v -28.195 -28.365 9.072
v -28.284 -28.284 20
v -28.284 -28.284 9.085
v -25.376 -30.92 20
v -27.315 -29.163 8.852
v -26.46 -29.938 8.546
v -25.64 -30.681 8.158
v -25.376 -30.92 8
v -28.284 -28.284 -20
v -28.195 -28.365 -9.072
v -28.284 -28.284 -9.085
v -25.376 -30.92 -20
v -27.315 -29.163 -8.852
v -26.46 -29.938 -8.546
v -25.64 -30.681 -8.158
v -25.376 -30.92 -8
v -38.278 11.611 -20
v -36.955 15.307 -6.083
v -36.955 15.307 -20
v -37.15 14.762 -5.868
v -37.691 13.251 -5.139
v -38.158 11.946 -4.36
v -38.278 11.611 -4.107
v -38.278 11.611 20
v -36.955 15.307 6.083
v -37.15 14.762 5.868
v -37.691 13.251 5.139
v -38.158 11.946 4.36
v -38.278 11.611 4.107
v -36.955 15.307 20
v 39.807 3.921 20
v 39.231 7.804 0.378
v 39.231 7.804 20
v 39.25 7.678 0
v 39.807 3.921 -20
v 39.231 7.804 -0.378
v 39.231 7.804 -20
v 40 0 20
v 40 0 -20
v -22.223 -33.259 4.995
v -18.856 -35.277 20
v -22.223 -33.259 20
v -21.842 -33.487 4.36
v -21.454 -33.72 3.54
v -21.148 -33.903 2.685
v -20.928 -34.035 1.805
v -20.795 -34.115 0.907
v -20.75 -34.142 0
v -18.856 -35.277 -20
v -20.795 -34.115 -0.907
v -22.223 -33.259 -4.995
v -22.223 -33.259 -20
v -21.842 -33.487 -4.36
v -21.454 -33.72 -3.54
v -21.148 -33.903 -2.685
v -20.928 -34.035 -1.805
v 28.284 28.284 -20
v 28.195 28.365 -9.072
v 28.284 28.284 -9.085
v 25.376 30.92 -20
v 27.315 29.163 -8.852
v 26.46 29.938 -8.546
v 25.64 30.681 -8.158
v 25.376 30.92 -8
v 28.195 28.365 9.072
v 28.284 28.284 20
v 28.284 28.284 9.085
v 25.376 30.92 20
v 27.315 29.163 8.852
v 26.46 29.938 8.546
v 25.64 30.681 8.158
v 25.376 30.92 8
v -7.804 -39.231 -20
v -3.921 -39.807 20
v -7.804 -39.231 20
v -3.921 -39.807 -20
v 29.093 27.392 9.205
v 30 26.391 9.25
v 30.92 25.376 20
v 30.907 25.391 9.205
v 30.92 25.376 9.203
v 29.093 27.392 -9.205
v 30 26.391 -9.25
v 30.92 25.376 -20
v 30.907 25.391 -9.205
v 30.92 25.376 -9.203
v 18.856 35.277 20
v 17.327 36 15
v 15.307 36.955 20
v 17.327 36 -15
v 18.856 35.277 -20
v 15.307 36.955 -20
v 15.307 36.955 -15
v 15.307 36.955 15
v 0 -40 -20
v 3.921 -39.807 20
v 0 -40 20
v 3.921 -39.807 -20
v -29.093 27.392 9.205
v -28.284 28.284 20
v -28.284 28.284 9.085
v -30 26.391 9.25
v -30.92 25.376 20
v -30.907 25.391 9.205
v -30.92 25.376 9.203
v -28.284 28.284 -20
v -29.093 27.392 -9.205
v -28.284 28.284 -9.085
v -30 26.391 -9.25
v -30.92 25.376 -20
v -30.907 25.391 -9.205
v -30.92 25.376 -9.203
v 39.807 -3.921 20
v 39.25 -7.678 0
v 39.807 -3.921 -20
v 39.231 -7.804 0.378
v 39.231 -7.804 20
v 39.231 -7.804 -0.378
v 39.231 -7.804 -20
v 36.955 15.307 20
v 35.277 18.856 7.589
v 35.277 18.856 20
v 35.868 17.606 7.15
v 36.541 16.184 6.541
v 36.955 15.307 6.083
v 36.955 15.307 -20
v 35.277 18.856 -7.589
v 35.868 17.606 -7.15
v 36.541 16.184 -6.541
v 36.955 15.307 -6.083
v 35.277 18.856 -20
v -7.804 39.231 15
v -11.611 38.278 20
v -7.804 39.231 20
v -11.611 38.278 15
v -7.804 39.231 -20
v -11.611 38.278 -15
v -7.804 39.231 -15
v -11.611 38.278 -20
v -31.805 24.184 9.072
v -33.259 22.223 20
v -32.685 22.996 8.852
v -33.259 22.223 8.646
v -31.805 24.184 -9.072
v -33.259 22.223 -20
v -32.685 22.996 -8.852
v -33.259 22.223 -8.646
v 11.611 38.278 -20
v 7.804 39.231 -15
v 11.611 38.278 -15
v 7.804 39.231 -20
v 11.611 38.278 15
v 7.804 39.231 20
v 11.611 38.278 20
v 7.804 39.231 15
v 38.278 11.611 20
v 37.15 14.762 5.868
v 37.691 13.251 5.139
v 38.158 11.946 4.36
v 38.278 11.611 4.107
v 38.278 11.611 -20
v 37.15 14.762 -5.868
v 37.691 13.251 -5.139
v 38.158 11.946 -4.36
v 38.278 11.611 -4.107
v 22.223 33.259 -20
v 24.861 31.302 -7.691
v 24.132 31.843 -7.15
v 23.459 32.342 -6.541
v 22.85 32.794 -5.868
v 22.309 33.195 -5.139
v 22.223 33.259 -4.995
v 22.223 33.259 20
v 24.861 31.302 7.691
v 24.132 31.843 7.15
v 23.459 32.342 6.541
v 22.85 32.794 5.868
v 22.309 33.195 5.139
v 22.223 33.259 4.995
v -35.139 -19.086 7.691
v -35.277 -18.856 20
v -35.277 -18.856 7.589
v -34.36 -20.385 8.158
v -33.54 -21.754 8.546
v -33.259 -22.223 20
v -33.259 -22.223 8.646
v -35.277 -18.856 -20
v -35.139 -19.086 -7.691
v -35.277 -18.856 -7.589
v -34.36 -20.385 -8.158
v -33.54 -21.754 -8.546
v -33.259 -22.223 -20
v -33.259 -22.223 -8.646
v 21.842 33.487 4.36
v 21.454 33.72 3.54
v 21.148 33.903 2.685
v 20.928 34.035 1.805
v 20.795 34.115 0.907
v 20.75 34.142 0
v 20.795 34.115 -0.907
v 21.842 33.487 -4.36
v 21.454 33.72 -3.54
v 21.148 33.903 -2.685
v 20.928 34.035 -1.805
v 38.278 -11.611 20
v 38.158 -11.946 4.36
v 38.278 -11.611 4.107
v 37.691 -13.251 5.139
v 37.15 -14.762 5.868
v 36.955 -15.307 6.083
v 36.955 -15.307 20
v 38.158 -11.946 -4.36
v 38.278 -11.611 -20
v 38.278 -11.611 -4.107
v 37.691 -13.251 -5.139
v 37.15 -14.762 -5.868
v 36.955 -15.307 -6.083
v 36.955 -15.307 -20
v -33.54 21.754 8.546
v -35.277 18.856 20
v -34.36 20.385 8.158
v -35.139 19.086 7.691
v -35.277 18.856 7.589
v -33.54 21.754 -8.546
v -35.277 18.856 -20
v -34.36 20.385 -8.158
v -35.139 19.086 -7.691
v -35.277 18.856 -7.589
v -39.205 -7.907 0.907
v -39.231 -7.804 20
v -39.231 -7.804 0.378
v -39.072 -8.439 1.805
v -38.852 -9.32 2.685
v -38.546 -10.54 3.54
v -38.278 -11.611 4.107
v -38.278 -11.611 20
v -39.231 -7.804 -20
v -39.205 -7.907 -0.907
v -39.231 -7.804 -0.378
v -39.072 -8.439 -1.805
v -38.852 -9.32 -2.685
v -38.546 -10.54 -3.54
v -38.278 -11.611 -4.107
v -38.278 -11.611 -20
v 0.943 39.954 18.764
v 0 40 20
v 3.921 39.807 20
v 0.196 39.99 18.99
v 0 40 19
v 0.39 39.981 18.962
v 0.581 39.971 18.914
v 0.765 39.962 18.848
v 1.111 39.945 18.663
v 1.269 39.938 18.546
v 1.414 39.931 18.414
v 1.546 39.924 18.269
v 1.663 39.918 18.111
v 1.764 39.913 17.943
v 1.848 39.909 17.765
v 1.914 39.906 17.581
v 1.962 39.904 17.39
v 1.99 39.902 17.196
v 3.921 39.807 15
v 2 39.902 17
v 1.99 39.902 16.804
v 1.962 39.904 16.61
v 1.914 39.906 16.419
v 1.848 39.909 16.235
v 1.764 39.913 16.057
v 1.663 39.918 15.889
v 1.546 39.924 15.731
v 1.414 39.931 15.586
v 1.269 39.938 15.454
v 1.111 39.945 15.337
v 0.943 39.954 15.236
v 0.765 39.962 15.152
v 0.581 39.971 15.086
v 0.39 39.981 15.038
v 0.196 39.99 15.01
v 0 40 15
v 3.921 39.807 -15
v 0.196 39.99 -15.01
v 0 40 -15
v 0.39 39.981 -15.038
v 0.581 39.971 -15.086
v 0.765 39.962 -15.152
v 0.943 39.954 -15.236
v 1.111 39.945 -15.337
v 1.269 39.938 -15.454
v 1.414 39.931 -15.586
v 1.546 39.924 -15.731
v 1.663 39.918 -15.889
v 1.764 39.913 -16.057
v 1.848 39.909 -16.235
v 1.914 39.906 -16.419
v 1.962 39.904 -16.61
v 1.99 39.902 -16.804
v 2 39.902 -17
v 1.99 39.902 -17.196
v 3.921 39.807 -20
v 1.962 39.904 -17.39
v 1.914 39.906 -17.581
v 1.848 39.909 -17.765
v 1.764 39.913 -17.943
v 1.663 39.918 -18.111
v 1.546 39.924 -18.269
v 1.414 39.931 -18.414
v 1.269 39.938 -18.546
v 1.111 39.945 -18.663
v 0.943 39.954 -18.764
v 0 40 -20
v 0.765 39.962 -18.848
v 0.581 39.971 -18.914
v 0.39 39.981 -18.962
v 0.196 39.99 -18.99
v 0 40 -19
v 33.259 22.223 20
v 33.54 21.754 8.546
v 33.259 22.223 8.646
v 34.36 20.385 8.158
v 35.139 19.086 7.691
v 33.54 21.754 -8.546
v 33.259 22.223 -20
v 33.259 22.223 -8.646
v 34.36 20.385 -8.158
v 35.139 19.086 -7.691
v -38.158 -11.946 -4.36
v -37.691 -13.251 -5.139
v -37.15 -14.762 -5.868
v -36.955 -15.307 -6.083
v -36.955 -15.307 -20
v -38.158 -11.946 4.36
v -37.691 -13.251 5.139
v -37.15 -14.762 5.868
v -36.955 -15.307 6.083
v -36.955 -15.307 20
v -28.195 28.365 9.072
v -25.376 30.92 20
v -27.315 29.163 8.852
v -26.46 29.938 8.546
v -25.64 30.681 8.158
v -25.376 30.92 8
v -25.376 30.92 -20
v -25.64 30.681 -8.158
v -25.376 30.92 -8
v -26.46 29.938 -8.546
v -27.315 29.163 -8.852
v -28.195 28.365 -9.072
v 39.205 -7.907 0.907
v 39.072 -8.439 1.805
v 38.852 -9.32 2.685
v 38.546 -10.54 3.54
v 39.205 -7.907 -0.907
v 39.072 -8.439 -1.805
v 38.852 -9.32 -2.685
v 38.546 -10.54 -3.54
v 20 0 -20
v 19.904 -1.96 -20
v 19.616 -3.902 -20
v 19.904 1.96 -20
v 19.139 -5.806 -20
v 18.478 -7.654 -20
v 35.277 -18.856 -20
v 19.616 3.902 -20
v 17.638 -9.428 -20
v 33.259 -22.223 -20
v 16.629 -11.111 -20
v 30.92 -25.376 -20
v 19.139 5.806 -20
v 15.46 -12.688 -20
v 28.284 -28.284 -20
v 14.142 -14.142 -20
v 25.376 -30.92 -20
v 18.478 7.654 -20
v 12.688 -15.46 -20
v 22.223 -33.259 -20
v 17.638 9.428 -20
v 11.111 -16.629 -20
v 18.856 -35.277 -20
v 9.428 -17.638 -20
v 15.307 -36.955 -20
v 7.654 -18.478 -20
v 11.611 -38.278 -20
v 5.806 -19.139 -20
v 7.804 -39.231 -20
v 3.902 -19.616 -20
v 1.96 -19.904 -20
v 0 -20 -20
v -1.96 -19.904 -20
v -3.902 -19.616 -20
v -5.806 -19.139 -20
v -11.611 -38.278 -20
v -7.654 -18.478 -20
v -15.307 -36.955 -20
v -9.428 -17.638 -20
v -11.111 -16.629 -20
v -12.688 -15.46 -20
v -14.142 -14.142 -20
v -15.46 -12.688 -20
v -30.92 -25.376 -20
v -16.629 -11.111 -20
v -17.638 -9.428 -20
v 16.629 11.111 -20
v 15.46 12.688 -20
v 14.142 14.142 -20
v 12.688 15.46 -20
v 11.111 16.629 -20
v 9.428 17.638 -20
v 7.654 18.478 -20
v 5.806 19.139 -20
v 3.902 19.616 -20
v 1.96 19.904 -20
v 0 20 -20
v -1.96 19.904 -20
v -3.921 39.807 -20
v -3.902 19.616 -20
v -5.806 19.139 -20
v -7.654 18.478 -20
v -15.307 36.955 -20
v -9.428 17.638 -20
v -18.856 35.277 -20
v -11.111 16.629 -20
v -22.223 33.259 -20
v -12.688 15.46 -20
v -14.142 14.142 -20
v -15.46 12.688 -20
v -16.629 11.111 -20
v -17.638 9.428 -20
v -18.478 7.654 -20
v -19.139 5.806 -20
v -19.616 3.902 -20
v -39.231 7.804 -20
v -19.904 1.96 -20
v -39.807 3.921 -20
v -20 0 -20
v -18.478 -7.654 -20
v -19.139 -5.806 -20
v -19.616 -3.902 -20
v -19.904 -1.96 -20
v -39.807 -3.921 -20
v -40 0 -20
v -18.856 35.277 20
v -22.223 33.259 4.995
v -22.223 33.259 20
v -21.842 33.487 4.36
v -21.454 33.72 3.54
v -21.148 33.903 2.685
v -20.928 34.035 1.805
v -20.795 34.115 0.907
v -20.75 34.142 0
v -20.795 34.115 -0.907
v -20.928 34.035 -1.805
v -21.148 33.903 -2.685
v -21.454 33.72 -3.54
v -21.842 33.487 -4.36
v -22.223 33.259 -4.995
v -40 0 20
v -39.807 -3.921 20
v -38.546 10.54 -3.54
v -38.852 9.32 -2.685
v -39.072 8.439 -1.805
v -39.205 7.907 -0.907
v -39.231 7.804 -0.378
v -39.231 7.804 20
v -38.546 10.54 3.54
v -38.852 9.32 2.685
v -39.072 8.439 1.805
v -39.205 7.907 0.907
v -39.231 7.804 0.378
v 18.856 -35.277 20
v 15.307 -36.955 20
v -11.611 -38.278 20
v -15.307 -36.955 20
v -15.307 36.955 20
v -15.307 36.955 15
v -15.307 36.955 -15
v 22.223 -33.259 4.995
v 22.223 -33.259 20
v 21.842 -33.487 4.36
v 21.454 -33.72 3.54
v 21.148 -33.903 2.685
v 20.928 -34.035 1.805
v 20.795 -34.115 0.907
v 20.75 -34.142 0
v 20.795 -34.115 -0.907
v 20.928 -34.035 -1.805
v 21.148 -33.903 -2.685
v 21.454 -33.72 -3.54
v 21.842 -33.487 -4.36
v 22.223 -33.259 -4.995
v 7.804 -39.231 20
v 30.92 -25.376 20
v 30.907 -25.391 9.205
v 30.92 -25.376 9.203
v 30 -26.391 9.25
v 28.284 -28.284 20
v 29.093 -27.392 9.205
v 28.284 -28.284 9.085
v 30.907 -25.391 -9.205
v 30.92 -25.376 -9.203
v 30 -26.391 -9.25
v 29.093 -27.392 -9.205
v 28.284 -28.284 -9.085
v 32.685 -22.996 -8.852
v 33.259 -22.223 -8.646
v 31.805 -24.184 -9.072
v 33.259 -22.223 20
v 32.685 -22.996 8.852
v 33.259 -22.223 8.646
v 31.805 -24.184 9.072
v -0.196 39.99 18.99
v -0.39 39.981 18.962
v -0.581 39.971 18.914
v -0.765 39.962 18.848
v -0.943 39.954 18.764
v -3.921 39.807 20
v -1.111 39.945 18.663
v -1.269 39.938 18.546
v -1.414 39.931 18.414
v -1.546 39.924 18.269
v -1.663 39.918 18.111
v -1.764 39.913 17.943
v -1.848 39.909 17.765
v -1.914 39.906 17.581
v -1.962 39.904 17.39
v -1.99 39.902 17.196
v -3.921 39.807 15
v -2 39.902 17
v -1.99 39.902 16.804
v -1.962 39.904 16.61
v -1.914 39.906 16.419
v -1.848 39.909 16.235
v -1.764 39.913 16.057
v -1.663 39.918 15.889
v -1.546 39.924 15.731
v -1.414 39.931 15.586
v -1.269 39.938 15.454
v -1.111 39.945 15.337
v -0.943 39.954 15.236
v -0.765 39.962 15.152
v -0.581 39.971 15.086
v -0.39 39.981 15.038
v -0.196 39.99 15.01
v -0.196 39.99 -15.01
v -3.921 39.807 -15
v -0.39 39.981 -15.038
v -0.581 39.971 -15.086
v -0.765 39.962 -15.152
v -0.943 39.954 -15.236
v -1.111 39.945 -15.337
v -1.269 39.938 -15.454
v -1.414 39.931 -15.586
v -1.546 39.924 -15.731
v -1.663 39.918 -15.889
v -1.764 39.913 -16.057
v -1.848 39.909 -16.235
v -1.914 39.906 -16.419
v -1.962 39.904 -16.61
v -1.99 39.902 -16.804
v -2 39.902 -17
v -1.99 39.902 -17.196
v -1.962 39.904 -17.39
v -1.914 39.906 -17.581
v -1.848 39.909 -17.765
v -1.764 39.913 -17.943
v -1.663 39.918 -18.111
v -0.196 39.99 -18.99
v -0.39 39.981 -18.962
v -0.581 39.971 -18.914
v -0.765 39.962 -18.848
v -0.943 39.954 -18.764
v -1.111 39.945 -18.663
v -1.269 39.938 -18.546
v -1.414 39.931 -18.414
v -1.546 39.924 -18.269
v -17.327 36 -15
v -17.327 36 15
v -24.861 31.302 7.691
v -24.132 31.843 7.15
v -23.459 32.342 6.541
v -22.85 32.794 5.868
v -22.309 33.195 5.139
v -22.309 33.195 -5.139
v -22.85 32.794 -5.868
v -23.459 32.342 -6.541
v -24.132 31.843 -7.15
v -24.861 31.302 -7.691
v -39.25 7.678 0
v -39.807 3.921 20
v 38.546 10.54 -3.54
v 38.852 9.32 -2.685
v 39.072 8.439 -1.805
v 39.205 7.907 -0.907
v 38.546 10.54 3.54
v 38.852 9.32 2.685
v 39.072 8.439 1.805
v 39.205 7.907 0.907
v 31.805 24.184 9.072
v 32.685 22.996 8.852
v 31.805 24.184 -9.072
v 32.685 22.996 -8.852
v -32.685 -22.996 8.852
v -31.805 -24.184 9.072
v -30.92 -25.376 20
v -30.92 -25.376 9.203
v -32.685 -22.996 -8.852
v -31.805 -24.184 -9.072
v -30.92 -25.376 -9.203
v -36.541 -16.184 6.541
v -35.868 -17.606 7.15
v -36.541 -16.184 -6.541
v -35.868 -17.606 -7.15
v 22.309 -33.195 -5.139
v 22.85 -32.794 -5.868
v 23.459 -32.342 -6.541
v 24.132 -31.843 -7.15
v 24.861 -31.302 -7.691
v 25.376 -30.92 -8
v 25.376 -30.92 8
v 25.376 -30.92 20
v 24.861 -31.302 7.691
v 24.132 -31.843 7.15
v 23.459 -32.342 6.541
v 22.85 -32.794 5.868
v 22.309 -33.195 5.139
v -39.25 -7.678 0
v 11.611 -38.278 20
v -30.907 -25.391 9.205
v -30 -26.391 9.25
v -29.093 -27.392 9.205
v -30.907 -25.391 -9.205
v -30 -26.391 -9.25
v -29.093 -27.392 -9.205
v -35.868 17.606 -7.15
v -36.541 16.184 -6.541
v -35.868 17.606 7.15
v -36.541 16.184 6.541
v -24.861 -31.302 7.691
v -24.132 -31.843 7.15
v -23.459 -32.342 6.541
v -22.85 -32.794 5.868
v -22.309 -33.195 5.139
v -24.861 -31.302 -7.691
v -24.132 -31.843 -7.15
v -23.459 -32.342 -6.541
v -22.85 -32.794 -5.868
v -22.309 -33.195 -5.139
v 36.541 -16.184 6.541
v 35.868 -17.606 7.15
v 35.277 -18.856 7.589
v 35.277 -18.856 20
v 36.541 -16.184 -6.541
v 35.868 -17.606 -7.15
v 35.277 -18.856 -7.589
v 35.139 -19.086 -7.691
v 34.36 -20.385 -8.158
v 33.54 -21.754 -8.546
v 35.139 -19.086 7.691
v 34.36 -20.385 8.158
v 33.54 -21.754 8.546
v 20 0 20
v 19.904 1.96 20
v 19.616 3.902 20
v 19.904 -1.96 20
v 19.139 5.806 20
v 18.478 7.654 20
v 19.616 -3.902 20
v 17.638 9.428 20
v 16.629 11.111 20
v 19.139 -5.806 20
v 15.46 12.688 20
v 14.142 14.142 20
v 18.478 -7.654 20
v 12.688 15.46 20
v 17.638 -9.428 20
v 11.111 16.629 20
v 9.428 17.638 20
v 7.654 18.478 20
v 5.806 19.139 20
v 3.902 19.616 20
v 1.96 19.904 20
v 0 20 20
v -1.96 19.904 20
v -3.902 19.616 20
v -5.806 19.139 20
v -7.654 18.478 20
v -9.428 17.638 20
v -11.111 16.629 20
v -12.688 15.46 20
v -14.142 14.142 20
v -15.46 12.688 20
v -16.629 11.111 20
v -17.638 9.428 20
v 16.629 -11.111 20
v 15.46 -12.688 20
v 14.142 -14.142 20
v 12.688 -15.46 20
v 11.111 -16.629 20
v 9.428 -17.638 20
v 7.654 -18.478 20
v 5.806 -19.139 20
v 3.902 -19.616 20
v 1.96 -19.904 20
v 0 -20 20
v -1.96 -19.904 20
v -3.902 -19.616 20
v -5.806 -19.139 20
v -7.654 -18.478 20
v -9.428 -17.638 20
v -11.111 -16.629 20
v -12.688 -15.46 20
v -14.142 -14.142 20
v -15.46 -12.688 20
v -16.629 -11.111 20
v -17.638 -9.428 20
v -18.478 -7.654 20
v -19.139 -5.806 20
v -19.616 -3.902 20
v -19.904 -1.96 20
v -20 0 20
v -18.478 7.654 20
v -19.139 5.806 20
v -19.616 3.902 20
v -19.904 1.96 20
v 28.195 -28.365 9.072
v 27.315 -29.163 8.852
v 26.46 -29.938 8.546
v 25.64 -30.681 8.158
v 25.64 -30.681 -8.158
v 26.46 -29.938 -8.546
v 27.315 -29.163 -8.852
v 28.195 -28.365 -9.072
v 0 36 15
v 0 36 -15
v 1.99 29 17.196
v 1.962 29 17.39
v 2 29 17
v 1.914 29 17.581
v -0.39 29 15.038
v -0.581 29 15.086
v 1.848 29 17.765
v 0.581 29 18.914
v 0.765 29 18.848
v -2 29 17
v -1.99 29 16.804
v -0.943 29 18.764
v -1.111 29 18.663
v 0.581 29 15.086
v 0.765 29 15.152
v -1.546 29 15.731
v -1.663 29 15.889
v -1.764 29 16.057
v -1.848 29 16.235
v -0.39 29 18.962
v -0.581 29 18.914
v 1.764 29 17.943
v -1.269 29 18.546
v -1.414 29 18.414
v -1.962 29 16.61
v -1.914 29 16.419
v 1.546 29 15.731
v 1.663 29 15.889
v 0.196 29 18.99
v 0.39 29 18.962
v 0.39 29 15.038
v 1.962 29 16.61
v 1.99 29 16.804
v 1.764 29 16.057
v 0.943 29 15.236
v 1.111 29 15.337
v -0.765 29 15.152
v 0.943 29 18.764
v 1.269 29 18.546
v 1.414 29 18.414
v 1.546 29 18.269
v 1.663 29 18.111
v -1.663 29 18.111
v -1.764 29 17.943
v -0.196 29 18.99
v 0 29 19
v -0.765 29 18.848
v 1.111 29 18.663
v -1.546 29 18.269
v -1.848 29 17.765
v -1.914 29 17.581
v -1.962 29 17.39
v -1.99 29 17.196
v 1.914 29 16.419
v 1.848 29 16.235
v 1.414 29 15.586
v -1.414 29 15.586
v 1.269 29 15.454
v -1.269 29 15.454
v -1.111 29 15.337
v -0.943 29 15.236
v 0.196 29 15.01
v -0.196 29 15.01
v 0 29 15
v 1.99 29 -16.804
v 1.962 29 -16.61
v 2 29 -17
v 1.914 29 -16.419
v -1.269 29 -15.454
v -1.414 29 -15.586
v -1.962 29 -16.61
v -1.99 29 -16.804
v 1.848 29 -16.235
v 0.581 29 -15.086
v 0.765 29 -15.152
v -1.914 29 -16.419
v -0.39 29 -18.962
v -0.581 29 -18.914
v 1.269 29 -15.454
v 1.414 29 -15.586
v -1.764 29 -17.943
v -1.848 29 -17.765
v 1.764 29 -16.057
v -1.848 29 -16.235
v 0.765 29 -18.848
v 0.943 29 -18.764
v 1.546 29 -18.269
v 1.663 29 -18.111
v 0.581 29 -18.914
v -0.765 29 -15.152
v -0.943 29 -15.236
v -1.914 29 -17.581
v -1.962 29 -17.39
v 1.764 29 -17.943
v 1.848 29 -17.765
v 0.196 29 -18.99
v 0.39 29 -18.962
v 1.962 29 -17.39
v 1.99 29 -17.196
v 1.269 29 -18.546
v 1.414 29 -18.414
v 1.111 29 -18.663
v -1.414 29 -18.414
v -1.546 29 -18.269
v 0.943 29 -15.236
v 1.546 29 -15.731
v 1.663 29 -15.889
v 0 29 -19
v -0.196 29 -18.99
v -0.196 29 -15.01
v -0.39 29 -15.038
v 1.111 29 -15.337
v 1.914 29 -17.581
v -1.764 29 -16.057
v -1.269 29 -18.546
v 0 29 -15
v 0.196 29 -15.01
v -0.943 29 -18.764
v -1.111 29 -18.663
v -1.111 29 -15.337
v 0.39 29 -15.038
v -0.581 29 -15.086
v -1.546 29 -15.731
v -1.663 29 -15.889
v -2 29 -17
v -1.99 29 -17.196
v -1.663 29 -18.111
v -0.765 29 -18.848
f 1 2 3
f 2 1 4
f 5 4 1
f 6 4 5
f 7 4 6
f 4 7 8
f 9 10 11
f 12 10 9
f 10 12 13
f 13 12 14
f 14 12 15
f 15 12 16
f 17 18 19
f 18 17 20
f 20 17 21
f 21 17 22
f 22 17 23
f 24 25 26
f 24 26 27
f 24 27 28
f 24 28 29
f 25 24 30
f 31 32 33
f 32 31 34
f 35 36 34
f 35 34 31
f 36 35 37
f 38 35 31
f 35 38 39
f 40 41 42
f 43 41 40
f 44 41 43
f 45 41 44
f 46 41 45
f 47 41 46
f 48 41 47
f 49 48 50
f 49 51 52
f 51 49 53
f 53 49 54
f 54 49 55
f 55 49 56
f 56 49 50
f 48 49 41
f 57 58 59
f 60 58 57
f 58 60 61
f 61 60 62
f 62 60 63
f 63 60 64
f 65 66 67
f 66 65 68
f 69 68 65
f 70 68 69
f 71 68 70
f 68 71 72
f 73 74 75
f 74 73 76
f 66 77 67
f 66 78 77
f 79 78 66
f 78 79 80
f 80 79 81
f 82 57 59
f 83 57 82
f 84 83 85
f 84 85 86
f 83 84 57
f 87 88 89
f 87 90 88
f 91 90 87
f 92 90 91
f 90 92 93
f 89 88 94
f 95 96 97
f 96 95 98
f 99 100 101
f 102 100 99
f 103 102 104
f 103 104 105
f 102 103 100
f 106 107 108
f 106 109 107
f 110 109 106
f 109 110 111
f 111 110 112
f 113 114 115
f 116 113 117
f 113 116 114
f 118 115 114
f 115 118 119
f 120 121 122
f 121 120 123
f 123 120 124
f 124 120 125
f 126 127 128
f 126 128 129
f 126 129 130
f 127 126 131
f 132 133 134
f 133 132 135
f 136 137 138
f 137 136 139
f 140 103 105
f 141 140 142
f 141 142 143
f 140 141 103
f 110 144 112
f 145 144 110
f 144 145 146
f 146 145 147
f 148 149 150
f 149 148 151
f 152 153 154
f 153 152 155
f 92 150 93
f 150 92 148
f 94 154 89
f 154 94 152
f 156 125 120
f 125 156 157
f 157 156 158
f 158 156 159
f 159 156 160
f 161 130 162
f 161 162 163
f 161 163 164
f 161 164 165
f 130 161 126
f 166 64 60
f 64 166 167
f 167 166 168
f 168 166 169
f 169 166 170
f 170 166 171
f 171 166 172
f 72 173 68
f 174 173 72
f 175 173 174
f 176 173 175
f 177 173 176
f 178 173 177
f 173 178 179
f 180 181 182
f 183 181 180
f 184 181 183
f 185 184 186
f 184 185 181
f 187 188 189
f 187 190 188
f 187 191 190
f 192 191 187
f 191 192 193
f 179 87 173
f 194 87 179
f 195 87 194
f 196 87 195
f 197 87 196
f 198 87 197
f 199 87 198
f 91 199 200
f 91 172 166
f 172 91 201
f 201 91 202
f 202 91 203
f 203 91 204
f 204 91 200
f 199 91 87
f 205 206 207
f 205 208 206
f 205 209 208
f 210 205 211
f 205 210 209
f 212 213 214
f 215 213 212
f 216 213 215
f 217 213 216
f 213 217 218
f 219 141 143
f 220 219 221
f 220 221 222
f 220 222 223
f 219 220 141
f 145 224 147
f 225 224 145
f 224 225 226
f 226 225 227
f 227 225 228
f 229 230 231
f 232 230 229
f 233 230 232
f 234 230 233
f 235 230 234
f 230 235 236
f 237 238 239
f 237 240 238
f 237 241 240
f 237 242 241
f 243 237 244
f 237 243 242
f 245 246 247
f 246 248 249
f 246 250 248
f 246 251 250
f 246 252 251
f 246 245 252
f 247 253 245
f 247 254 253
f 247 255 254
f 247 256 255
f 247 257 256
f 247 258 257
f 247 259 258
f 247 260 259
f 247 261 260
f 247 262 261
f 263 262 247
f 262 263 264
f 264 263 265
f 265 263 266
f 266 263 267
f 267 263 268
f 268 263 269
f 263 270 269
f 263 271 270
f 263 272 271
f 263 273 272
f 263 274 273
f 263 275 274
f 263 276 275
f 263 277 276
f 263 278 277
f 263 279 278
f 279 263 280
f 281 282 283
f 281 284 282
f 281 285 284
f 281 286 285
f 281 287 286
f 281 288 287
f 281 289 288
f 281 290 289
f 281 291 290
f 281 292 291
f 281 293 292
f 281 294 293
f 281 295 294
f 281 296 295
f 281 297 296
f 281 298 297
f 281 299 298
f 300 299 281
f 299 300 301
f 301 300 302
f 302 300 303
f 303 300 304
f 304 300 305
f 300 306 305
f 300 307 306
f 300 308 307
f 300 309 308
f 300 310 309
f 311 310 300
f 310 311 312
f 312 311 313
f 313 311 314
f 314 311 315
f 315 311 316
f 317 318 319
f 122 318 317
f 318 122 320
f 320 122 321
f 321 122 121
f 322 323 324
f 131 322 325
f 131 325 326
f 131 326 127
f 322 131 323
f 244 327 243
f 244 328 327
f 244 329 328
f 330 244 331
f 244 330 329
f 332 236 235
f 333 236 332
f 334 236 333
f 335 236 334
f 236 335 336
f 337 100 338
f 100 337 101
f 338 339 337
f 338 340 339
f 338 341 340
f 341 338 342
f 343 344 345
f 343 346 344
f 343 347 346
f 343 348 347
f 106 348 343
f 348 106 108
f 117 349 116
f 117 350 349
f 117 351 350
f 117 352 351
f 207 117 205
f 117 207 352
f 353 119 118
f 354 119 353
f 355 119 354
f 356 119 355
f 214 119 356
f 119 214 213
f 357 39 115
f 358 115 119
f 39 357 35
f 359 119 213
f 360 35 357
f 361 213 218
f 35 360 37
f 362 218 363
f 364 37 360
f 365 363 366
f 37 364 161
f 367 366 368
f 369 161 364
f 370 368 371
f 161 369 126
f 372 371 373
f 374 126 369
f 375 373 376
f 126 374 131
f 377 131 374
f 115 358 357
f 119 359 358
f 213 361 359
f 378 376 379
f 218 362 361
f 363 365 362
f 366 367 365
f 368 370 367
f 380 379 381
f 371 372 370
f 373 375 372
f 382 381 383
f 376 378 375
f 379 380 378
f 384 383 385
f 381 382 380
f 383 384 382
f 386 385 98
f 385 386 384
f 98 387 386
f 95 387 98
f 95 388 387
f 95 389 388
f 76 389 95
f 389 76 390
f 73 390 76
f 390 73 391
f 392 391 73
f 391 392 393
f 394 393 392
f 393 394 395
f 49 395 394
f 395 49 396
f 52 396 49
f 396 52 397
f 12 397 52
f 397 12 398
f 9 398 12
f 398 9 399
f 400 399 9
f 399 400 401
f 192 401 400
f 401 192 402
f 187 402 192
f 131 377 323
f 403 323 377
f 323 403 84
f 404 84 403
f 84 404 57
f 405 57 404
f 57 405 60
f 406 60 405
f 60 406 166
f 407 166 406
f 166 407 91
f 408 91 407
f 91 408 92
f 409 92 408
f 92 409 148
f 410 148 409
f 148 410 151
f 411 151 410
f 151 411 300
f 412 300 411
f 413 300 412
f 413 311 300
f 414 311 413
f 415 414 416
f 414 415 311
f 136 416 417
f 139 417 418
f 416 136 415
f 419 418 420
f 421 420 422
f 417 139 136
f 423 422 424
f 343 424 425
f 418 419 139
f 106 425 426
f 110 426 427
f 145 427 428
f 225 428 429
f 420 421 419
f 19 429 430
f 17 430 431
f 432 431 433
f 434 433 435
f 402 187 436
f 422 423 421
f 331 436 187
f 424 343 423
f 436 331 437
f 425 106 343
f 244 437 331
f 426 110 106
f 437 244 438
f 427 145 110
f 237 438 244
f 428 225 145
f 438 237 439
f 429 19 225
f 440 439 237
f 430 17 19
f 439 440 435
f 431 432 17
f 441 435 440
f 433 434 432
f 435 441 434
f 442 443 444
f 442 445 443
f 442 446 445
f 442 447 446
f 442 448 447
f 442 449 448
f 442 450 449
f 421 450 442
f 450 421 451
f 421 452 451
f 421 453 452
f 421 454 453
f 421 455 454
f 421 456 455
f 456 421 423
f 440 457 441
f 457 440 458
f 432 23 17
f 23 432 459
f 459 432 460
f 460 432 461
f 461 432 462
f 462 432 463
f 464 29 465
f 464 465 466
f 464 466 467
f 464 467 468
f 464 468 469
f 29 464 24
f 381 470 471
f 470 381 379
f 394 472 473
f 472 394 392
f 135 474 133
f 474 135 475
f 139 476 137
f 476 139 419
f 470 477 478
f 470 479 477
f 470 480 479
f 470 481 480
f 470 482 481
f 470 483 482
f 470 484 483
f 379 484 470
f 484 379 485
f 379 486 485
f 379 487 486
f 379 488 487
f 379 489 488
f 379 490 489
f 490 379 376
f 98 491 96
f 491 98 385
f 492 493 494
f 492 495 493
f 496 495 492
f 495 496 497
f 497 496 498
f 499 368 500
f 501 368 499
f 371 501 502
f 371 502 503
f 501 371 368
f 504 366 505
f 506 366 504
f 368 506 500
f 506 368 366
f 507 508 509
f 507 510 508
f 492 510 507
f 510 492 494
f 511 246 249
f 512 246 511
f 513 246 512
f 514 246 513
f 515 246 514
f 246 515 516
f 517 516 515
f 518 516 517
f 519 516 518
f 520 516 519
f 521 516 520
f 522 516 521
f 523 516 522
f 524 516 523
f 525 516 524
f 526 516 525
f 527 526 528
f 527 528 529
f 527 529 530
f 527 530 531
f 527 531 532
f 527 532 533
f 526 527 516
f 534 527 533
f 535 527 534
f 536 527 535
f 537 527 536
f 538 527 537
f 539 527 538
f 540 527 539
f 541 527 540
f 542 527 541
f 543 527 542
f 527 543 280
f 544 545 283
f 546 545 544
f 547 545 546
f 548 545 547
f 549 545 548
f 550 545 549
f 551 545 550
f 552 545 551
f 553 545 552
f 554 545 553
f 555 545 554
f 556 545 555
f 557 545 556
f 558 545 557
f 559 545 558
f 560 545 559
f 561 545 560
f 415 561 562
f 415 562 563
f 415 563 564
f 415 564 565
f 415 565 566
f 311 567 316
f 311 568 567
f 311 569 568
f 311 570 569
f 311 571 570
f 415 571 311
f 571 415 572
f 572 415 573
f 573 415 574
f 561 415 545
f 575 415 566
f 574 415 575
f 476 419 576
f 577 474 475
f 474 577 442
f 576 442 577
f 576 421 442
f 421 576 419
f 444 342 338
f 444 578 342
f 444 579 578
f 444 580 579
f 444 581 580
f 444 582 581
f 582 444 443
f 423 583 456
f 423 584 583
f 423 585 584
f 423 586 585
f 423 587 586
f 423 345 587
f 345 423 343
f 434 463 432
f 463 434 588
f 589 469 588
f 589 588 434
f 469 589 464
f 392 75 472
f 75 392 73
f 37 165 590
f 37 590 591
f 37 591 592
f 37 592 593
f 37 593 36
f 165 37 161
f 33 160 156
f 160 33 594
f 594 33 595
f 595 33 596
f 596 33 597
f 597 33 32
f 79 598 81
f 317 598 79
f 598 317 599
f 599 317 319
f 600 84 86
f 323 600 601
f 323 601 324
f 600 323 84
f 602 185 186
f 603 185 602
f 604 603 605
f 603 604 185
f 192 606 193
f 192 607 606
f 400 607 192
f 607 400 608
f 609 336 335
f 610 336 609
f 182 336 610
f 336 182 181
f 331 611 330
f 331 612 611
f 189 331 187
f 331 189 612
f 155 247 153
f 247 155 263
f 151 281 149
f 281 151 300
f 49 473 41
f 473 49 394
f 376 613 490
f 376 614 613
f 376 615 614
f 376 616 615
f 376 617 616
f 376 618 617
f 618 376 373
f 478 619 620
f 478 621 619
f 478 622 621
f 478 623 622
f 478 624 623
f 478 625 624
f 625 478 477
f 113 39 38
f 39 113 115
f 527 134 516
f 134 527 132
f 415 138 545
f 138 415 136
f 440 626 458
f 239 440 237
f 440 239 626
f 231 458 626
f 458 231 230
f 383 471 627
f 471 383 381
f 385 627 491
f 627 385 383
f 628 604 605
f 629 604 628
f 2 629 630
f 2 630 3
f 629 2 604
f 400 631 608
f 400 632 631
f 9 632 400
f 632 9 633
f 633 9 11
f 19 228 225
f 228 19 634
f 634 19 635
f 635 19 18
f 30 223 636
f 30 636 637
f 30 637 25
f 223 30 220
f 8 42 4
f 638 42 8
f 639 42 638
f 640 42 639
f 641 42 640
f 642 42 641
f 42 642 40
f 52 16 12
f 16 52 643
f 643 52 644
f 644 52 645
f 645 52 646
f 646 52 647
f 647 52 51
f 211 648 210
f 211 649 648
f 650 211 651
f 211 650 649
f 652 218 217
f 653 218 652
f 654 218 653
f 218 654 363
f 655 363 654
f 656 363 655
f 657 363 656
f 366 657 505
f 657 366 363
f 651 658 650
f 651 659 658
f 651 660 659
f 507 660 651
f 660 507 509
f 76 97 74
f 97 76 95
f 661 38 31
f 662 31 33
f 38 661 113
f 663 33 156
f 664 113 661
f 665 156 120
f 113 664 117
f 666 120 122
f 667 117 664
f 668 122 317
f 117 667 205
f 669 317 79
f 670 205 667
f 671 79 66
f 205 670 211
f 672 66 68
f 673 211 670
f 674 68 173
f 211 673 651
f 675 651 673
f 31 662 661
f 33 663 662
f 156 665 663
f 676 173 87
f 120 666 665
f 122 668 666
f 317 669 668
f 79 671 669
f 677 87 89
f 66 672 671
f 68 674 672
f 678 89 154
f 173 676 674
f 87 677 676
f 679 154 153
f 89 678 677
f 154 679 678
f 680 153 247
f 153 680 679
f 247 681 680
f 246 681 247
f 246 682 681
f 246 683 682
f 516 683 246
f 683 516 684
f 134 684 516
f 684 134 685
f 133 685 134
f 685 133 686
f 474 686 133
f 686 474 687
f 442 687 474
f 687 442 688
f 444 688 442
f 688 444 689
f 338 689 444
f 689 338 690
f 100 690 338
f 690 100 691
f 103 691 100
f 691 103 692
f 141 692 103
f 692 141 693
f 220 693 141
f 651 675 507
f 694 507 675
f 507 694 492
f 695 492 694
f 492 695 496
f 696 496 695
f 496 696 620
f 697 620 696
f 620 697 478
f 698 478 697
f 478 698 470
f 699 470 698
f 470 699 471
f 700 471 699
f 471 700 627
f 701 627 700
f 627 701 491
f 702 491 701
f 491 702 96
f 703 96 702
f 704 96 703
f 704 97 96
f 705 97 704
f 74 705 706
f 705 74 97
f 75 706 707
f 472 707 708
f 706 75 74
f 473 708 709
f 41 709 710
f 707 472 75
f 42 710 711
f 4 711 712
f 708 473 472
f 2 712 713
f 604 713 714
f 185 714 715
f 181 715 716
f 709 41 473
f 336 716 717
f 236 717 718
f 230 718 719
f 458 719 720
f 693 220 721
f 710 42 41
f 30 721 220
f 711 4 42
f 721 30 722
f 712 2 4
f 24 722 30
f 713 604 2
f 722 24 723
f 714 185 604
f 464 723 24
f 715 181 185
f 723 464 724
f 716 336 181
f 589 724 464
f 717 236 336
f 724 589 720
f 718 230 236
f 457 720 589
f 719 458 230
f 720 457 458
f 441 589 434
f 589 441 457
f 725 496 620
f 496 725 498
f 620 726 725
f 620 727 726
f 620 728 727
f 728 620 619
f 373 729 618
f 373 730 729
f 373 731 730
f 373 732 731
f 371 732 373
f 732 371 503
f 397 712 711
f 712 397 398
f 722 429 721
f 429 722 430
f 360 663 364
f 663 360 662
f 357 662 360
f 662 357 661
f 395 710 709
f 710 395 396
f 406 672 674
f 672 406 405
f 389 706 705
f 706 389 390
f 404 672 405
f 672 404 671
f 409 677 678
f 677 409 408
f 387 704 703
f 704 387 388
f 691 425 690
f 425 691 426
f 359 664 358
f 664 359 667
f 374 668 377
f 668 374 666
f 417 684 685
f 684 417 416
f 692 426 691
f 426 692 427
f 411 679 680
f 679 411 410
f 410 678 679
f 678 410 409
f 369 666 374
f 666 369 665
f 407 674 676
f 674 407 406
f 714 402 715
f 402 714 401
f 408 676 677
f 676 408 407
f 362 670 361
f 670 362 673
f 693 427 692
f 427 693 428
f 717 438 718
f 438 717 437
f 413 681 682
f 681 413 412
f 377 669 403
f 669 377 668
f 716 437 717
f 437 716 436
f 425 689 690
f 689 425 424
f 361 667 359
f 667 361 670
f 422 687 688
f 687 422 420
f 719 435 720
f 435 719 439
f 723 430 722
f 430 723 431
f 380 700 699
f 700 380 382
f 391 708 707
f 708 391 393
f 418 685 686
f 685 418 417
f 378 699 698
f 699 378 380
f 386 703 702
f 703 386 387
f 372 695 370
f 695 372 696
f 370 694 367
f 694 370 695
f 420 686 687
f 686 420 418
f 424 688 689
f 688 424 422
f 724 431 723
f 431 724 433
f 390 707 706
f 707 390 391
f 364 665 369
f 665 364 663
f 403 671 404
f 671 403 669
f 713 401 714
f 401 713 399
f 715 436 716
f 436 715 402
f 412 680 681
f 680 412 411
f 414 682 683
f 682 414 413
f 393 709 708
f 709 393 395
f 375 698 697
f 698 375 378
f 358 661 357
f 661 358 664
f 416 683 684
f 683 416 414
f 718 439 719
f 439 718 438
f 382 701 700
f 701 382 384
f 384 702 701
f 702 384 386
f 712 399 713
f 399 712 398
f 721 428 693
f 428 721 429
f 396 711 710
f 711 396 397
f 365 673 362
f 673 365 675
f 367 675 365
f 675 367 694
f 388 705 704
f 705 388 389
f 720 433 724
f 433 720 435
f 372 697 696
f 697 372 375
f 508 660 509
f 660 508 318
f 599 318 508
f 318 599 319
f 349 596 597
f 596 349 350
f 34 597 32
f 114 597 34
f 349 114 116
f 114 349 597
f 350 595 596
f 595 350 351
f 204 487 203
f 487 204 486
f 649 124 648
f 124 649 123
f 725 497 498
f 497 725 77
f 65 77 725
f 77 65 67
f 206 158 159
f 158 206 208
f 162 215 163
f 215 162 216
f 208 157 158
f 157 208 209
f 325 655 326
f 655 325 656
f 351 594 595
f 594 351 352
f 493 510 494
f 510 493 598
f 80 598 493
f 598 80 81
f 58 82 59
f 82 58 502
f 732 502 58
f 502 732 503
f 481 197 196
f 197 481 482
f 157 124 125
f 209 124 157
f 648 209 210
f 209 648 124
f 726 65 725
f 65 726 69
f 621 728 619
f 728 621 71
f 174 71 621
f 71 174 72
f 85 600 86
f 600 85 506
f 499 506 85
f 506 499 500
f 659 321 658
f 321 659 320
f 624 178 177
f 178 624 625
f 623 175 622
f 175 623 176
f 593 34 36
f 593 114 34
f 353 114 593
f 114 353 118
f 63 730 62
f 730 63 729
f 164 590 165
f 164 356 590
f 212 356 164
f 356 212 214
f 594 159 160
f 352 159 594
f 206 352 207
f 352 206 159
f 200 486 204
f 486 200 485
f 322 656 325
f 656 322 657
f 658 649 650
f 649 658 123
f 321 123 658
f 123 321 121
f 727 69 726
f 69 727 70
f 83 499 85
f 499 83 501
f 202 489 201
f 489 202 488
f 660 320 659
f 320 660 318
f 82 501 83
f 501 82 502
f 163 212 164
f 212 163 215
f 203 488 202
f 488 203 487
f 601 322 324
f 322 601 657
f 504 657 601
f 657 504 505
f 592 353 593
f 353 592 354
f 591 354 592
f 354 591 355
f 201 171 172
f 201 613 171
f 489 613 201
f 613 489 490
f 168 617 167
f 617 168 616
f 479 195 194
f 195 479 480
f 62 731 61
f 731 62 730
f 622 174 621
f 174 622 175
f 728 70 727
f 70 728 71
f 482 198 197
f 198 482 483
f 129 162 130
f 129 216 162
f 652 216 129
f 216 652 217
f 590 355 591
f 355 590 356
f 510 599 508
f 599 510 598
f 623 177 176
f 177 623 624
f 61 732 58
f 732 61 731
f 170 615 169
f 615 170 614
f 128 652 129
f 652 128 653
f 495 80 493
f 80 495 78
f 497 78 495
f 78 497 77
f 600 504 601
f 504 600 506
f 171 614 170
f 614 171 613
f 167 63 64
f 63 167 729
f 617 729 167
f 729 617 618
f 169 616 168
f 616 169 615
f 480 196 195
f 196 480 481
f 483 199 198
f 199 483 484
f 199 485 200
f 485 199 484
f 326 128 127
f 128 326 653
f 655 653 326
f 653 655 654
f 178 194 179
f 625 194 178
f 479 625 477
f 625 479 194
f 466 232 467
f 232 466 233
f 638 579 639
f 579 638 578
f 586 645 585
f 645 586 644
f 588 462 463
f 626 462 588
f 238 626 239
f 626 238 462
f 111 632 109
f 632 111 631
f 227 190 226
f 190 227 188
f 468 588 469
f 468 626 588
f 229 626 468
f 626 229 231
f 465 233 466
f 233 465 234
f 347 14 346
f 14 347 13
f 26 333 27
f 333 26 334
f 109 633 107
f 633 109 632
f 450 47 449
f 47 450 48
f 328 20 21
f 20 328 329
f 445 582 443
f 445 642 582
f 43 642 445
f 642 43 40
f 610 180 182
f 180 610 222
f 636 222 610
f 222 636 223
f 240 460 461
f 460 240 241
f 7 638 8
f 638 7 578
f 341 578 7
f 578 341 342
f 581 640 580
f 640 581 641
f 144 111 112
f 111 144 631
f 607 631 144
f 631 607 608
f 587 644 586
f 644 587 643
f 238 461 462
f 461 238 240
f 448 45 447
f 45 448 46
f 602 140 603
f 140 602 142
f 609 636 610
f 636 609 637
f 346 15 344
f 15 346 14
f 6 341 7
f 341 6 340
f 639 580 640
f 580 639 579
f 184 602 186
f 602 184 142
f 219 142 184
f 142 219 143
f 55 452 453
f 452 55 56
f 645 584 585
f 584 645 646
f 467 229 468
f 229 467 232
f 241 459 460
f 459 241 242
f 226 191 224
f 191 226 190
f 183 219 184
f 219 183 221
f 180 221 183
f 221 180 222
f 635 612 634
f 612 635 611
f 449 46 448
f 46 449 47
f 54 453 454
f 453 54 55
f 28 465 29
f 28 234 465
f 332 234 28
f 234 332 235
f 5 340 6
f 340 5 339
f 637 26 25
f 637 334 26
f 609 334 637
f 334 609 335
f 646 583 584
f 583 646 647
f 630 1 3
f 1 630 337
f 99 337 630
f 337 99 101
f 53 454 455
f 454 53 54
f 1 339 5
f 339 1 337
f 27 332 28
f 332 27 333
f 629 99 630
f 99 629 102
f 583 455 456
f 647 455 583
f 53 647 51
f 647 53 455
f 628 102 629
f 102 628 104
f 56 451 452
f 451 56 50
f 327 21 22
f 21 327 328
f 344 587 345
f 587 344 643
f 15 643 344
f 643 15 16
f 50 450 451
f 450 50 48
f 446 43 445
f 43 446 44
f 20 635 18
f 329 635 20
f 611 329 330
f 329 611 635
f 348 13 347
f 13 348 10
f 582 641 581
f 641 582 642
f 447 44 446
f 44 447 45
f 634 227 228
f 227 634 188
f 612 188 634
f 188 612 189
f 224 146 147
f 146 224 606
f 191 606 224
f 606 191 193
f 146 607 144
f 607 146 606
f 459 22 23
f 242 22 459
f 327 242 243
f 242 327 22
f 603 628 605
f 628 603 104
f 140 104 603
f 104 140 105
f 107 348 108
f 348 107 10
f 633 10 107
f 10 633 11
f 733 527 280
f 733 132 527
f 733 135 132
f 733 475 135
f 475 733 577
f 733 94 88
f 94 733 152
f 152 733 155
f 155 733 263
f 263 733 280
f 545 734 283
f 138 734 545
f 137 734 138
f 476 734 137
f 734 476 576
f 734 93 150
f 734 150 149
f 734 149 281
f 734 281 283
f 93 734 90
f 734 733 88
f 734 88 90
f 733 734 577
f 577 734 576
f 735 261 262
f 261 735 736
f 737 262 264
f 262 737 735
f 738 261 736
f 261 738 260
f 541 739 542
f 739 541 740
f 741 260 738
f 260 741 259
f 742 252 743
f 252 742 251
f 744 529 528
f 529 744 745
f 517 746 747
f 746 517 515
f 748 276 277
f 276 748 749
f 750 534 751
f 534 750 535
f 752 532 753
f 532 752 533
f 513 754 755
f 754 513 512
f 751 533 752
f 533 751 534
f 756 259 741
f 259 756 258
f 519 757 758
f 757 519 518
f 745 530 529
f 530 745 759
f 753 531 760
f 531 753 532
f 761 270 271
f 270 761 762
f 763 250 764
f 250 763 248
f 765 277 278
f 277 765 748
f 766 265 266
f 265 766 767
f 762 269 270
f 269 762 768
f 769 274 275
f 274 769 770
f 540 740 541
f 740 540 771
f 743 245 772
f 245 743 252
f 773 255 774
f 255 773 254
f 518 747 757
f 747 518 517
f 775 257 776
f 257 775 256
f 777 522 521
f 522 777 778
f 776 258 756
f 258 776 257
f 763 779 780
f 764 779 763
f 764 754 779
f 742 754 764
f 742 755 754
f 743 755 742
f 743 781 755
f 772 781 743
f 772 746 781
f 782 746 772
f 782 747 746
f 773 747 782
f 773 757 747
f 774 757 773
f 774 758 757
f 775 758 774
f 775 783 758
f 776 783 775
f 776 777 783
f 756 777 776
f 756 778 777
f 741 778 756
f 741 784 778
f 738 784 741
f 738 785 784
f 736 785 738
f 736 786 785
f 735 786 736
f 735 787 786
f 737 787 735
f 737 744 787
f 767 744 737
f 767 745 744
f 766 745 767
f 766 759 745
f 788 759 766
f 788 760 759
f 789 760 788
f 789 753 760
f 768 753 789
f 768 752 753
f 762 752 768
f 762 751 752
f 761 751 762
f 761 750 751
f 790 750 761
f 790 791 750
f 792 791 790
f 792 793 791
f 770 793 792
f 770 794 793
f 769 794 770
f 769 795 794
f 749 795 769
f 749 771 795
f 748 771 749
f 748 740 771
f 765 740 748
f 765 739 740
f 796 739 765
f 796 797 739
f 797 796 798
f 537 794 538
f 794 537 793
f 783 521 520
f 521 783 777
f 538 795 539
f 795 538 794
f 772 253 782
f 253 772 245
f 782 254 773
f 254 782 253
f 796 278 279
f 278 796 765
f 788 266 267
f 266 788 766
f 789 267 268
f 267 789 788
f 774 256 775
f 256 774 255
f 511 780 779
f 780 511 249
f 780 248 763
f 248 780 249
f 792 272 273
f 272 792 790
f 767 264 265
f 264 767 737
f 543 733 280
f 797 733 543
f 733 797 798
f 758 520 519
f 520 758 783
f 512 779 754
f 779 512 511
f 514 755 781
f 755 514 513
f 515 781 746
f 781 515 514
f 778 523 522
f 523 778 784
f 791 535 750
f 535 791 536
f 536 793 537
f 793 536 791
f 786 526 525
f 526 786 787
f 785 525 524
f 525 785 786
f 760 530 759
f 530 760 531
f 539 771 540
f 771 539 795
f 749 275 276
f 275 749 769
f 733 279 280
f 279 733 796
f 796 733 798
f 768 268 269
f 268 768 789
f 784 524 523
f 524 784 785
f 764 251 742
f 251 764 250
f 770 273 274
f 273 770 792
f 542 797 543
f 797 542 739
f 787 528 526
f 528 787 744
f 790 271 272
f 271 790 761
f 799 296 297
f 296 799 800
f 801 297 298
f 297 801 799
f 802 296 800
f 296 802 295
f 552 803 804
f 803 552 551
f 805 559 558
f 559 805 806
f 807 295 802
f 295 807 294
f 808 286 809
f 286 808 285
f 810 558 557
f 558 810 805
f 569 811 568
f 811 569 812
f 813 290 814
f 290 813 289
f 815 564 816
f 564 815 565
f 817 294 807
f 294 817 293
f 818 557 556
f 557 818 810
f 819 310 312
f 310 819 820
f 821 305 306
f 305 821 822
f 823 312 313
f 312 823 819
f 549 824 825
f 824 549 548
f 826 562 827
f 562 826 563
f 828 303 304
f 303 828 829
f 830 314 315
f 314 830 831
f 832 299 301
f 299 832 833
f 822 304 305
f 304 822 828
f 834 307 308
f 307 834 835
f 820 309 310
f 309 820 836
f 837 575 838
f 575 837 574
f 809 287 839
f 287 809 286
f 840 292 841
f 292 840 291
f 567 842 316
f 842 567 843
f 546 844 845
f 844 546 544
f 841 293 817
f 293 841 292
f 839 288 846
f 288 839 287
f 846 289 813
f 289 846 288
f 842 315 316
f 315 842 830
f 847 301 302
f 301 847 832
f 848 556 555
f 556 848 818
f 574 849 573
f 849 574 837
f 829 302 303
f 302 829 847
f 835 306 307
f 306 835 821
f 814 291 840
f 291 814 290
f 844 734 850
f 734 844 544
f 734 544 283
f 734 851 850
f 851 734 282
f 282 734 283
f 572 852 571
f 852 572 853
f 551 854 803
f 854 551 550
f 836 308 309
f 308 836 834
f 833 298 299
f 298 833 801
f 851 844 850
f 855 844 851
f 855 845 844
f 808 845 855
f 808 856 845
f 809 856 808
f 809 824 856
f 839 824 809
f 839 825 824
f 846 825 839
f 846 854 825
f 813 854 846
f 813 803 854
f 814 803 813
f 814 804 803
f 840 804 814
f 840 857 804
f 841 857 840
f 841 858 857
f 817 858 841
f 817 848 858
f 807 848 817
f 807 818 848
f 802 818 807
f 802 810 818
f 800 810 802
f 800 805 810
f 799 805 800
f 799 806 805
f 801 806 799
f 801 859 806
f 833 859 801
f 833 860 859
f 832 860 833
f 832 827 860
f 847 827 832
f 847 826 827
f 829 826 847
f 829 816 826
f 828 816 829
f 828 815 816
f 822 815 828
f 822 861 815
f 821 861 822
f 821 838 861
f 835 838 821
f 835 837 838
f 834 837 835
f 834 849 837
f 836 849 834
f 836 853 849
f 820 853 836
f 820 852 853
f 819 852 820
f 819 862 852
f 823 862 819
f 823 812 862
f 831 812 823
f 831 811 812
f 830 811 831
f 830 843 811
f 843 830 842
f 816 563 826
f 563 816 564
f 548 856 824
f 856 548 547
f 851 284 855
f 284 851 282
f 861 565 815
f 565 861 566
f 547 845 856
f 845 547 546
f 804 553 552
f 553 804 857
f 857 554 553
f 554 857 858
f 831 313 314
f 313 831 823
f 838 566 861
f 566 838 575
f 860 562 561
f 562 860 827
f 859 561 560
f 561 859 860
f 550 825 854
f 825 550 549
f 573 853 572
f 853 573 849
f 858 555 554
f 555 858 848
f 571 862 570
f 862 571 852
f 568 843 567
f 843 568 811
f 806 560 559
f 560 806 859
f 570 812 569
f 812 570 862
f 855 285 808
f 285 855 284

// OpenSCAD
// COBRA Vertebra - T7 V13
// Height: 40.0mm, OD: 80.0mm

$fn = 64;

difference() {
    // Outer cylinder
    cylinder(h=40.0, d=80.0, center=true);
    
    // Inner channel
    cylinder(h=42.0, d=40.0, center=true);

    // Battery cavity 1
    rotate([0, 0, 0])
    translate([30.0, 0, 0])
    rotate([90, 0, 0])
    cylinder(h=74.0, d=18.5, center=true);

    // Battery cavity 2
    rotate([0, 0, 180])
    translate([30.0, 0, 0])
    rotate([90, 0, 0])
    cylinder(h=74.0, d=18.5, center=true);

    // Solar panel cavity
    translate([0, 38.0, 0])
    cube([50, 4, 30], center=true);

    // Pivot holes
    translate([0, 40.0, 17.0])
    rotate([90, 0, 0])
    cylinder(h=22.0, d=4, center=true);
    
    translate([0, 40.0, -17.0])
    rotate([90, 0, 0])
    cylinder(h=22.0, d=4, center=true);
}
